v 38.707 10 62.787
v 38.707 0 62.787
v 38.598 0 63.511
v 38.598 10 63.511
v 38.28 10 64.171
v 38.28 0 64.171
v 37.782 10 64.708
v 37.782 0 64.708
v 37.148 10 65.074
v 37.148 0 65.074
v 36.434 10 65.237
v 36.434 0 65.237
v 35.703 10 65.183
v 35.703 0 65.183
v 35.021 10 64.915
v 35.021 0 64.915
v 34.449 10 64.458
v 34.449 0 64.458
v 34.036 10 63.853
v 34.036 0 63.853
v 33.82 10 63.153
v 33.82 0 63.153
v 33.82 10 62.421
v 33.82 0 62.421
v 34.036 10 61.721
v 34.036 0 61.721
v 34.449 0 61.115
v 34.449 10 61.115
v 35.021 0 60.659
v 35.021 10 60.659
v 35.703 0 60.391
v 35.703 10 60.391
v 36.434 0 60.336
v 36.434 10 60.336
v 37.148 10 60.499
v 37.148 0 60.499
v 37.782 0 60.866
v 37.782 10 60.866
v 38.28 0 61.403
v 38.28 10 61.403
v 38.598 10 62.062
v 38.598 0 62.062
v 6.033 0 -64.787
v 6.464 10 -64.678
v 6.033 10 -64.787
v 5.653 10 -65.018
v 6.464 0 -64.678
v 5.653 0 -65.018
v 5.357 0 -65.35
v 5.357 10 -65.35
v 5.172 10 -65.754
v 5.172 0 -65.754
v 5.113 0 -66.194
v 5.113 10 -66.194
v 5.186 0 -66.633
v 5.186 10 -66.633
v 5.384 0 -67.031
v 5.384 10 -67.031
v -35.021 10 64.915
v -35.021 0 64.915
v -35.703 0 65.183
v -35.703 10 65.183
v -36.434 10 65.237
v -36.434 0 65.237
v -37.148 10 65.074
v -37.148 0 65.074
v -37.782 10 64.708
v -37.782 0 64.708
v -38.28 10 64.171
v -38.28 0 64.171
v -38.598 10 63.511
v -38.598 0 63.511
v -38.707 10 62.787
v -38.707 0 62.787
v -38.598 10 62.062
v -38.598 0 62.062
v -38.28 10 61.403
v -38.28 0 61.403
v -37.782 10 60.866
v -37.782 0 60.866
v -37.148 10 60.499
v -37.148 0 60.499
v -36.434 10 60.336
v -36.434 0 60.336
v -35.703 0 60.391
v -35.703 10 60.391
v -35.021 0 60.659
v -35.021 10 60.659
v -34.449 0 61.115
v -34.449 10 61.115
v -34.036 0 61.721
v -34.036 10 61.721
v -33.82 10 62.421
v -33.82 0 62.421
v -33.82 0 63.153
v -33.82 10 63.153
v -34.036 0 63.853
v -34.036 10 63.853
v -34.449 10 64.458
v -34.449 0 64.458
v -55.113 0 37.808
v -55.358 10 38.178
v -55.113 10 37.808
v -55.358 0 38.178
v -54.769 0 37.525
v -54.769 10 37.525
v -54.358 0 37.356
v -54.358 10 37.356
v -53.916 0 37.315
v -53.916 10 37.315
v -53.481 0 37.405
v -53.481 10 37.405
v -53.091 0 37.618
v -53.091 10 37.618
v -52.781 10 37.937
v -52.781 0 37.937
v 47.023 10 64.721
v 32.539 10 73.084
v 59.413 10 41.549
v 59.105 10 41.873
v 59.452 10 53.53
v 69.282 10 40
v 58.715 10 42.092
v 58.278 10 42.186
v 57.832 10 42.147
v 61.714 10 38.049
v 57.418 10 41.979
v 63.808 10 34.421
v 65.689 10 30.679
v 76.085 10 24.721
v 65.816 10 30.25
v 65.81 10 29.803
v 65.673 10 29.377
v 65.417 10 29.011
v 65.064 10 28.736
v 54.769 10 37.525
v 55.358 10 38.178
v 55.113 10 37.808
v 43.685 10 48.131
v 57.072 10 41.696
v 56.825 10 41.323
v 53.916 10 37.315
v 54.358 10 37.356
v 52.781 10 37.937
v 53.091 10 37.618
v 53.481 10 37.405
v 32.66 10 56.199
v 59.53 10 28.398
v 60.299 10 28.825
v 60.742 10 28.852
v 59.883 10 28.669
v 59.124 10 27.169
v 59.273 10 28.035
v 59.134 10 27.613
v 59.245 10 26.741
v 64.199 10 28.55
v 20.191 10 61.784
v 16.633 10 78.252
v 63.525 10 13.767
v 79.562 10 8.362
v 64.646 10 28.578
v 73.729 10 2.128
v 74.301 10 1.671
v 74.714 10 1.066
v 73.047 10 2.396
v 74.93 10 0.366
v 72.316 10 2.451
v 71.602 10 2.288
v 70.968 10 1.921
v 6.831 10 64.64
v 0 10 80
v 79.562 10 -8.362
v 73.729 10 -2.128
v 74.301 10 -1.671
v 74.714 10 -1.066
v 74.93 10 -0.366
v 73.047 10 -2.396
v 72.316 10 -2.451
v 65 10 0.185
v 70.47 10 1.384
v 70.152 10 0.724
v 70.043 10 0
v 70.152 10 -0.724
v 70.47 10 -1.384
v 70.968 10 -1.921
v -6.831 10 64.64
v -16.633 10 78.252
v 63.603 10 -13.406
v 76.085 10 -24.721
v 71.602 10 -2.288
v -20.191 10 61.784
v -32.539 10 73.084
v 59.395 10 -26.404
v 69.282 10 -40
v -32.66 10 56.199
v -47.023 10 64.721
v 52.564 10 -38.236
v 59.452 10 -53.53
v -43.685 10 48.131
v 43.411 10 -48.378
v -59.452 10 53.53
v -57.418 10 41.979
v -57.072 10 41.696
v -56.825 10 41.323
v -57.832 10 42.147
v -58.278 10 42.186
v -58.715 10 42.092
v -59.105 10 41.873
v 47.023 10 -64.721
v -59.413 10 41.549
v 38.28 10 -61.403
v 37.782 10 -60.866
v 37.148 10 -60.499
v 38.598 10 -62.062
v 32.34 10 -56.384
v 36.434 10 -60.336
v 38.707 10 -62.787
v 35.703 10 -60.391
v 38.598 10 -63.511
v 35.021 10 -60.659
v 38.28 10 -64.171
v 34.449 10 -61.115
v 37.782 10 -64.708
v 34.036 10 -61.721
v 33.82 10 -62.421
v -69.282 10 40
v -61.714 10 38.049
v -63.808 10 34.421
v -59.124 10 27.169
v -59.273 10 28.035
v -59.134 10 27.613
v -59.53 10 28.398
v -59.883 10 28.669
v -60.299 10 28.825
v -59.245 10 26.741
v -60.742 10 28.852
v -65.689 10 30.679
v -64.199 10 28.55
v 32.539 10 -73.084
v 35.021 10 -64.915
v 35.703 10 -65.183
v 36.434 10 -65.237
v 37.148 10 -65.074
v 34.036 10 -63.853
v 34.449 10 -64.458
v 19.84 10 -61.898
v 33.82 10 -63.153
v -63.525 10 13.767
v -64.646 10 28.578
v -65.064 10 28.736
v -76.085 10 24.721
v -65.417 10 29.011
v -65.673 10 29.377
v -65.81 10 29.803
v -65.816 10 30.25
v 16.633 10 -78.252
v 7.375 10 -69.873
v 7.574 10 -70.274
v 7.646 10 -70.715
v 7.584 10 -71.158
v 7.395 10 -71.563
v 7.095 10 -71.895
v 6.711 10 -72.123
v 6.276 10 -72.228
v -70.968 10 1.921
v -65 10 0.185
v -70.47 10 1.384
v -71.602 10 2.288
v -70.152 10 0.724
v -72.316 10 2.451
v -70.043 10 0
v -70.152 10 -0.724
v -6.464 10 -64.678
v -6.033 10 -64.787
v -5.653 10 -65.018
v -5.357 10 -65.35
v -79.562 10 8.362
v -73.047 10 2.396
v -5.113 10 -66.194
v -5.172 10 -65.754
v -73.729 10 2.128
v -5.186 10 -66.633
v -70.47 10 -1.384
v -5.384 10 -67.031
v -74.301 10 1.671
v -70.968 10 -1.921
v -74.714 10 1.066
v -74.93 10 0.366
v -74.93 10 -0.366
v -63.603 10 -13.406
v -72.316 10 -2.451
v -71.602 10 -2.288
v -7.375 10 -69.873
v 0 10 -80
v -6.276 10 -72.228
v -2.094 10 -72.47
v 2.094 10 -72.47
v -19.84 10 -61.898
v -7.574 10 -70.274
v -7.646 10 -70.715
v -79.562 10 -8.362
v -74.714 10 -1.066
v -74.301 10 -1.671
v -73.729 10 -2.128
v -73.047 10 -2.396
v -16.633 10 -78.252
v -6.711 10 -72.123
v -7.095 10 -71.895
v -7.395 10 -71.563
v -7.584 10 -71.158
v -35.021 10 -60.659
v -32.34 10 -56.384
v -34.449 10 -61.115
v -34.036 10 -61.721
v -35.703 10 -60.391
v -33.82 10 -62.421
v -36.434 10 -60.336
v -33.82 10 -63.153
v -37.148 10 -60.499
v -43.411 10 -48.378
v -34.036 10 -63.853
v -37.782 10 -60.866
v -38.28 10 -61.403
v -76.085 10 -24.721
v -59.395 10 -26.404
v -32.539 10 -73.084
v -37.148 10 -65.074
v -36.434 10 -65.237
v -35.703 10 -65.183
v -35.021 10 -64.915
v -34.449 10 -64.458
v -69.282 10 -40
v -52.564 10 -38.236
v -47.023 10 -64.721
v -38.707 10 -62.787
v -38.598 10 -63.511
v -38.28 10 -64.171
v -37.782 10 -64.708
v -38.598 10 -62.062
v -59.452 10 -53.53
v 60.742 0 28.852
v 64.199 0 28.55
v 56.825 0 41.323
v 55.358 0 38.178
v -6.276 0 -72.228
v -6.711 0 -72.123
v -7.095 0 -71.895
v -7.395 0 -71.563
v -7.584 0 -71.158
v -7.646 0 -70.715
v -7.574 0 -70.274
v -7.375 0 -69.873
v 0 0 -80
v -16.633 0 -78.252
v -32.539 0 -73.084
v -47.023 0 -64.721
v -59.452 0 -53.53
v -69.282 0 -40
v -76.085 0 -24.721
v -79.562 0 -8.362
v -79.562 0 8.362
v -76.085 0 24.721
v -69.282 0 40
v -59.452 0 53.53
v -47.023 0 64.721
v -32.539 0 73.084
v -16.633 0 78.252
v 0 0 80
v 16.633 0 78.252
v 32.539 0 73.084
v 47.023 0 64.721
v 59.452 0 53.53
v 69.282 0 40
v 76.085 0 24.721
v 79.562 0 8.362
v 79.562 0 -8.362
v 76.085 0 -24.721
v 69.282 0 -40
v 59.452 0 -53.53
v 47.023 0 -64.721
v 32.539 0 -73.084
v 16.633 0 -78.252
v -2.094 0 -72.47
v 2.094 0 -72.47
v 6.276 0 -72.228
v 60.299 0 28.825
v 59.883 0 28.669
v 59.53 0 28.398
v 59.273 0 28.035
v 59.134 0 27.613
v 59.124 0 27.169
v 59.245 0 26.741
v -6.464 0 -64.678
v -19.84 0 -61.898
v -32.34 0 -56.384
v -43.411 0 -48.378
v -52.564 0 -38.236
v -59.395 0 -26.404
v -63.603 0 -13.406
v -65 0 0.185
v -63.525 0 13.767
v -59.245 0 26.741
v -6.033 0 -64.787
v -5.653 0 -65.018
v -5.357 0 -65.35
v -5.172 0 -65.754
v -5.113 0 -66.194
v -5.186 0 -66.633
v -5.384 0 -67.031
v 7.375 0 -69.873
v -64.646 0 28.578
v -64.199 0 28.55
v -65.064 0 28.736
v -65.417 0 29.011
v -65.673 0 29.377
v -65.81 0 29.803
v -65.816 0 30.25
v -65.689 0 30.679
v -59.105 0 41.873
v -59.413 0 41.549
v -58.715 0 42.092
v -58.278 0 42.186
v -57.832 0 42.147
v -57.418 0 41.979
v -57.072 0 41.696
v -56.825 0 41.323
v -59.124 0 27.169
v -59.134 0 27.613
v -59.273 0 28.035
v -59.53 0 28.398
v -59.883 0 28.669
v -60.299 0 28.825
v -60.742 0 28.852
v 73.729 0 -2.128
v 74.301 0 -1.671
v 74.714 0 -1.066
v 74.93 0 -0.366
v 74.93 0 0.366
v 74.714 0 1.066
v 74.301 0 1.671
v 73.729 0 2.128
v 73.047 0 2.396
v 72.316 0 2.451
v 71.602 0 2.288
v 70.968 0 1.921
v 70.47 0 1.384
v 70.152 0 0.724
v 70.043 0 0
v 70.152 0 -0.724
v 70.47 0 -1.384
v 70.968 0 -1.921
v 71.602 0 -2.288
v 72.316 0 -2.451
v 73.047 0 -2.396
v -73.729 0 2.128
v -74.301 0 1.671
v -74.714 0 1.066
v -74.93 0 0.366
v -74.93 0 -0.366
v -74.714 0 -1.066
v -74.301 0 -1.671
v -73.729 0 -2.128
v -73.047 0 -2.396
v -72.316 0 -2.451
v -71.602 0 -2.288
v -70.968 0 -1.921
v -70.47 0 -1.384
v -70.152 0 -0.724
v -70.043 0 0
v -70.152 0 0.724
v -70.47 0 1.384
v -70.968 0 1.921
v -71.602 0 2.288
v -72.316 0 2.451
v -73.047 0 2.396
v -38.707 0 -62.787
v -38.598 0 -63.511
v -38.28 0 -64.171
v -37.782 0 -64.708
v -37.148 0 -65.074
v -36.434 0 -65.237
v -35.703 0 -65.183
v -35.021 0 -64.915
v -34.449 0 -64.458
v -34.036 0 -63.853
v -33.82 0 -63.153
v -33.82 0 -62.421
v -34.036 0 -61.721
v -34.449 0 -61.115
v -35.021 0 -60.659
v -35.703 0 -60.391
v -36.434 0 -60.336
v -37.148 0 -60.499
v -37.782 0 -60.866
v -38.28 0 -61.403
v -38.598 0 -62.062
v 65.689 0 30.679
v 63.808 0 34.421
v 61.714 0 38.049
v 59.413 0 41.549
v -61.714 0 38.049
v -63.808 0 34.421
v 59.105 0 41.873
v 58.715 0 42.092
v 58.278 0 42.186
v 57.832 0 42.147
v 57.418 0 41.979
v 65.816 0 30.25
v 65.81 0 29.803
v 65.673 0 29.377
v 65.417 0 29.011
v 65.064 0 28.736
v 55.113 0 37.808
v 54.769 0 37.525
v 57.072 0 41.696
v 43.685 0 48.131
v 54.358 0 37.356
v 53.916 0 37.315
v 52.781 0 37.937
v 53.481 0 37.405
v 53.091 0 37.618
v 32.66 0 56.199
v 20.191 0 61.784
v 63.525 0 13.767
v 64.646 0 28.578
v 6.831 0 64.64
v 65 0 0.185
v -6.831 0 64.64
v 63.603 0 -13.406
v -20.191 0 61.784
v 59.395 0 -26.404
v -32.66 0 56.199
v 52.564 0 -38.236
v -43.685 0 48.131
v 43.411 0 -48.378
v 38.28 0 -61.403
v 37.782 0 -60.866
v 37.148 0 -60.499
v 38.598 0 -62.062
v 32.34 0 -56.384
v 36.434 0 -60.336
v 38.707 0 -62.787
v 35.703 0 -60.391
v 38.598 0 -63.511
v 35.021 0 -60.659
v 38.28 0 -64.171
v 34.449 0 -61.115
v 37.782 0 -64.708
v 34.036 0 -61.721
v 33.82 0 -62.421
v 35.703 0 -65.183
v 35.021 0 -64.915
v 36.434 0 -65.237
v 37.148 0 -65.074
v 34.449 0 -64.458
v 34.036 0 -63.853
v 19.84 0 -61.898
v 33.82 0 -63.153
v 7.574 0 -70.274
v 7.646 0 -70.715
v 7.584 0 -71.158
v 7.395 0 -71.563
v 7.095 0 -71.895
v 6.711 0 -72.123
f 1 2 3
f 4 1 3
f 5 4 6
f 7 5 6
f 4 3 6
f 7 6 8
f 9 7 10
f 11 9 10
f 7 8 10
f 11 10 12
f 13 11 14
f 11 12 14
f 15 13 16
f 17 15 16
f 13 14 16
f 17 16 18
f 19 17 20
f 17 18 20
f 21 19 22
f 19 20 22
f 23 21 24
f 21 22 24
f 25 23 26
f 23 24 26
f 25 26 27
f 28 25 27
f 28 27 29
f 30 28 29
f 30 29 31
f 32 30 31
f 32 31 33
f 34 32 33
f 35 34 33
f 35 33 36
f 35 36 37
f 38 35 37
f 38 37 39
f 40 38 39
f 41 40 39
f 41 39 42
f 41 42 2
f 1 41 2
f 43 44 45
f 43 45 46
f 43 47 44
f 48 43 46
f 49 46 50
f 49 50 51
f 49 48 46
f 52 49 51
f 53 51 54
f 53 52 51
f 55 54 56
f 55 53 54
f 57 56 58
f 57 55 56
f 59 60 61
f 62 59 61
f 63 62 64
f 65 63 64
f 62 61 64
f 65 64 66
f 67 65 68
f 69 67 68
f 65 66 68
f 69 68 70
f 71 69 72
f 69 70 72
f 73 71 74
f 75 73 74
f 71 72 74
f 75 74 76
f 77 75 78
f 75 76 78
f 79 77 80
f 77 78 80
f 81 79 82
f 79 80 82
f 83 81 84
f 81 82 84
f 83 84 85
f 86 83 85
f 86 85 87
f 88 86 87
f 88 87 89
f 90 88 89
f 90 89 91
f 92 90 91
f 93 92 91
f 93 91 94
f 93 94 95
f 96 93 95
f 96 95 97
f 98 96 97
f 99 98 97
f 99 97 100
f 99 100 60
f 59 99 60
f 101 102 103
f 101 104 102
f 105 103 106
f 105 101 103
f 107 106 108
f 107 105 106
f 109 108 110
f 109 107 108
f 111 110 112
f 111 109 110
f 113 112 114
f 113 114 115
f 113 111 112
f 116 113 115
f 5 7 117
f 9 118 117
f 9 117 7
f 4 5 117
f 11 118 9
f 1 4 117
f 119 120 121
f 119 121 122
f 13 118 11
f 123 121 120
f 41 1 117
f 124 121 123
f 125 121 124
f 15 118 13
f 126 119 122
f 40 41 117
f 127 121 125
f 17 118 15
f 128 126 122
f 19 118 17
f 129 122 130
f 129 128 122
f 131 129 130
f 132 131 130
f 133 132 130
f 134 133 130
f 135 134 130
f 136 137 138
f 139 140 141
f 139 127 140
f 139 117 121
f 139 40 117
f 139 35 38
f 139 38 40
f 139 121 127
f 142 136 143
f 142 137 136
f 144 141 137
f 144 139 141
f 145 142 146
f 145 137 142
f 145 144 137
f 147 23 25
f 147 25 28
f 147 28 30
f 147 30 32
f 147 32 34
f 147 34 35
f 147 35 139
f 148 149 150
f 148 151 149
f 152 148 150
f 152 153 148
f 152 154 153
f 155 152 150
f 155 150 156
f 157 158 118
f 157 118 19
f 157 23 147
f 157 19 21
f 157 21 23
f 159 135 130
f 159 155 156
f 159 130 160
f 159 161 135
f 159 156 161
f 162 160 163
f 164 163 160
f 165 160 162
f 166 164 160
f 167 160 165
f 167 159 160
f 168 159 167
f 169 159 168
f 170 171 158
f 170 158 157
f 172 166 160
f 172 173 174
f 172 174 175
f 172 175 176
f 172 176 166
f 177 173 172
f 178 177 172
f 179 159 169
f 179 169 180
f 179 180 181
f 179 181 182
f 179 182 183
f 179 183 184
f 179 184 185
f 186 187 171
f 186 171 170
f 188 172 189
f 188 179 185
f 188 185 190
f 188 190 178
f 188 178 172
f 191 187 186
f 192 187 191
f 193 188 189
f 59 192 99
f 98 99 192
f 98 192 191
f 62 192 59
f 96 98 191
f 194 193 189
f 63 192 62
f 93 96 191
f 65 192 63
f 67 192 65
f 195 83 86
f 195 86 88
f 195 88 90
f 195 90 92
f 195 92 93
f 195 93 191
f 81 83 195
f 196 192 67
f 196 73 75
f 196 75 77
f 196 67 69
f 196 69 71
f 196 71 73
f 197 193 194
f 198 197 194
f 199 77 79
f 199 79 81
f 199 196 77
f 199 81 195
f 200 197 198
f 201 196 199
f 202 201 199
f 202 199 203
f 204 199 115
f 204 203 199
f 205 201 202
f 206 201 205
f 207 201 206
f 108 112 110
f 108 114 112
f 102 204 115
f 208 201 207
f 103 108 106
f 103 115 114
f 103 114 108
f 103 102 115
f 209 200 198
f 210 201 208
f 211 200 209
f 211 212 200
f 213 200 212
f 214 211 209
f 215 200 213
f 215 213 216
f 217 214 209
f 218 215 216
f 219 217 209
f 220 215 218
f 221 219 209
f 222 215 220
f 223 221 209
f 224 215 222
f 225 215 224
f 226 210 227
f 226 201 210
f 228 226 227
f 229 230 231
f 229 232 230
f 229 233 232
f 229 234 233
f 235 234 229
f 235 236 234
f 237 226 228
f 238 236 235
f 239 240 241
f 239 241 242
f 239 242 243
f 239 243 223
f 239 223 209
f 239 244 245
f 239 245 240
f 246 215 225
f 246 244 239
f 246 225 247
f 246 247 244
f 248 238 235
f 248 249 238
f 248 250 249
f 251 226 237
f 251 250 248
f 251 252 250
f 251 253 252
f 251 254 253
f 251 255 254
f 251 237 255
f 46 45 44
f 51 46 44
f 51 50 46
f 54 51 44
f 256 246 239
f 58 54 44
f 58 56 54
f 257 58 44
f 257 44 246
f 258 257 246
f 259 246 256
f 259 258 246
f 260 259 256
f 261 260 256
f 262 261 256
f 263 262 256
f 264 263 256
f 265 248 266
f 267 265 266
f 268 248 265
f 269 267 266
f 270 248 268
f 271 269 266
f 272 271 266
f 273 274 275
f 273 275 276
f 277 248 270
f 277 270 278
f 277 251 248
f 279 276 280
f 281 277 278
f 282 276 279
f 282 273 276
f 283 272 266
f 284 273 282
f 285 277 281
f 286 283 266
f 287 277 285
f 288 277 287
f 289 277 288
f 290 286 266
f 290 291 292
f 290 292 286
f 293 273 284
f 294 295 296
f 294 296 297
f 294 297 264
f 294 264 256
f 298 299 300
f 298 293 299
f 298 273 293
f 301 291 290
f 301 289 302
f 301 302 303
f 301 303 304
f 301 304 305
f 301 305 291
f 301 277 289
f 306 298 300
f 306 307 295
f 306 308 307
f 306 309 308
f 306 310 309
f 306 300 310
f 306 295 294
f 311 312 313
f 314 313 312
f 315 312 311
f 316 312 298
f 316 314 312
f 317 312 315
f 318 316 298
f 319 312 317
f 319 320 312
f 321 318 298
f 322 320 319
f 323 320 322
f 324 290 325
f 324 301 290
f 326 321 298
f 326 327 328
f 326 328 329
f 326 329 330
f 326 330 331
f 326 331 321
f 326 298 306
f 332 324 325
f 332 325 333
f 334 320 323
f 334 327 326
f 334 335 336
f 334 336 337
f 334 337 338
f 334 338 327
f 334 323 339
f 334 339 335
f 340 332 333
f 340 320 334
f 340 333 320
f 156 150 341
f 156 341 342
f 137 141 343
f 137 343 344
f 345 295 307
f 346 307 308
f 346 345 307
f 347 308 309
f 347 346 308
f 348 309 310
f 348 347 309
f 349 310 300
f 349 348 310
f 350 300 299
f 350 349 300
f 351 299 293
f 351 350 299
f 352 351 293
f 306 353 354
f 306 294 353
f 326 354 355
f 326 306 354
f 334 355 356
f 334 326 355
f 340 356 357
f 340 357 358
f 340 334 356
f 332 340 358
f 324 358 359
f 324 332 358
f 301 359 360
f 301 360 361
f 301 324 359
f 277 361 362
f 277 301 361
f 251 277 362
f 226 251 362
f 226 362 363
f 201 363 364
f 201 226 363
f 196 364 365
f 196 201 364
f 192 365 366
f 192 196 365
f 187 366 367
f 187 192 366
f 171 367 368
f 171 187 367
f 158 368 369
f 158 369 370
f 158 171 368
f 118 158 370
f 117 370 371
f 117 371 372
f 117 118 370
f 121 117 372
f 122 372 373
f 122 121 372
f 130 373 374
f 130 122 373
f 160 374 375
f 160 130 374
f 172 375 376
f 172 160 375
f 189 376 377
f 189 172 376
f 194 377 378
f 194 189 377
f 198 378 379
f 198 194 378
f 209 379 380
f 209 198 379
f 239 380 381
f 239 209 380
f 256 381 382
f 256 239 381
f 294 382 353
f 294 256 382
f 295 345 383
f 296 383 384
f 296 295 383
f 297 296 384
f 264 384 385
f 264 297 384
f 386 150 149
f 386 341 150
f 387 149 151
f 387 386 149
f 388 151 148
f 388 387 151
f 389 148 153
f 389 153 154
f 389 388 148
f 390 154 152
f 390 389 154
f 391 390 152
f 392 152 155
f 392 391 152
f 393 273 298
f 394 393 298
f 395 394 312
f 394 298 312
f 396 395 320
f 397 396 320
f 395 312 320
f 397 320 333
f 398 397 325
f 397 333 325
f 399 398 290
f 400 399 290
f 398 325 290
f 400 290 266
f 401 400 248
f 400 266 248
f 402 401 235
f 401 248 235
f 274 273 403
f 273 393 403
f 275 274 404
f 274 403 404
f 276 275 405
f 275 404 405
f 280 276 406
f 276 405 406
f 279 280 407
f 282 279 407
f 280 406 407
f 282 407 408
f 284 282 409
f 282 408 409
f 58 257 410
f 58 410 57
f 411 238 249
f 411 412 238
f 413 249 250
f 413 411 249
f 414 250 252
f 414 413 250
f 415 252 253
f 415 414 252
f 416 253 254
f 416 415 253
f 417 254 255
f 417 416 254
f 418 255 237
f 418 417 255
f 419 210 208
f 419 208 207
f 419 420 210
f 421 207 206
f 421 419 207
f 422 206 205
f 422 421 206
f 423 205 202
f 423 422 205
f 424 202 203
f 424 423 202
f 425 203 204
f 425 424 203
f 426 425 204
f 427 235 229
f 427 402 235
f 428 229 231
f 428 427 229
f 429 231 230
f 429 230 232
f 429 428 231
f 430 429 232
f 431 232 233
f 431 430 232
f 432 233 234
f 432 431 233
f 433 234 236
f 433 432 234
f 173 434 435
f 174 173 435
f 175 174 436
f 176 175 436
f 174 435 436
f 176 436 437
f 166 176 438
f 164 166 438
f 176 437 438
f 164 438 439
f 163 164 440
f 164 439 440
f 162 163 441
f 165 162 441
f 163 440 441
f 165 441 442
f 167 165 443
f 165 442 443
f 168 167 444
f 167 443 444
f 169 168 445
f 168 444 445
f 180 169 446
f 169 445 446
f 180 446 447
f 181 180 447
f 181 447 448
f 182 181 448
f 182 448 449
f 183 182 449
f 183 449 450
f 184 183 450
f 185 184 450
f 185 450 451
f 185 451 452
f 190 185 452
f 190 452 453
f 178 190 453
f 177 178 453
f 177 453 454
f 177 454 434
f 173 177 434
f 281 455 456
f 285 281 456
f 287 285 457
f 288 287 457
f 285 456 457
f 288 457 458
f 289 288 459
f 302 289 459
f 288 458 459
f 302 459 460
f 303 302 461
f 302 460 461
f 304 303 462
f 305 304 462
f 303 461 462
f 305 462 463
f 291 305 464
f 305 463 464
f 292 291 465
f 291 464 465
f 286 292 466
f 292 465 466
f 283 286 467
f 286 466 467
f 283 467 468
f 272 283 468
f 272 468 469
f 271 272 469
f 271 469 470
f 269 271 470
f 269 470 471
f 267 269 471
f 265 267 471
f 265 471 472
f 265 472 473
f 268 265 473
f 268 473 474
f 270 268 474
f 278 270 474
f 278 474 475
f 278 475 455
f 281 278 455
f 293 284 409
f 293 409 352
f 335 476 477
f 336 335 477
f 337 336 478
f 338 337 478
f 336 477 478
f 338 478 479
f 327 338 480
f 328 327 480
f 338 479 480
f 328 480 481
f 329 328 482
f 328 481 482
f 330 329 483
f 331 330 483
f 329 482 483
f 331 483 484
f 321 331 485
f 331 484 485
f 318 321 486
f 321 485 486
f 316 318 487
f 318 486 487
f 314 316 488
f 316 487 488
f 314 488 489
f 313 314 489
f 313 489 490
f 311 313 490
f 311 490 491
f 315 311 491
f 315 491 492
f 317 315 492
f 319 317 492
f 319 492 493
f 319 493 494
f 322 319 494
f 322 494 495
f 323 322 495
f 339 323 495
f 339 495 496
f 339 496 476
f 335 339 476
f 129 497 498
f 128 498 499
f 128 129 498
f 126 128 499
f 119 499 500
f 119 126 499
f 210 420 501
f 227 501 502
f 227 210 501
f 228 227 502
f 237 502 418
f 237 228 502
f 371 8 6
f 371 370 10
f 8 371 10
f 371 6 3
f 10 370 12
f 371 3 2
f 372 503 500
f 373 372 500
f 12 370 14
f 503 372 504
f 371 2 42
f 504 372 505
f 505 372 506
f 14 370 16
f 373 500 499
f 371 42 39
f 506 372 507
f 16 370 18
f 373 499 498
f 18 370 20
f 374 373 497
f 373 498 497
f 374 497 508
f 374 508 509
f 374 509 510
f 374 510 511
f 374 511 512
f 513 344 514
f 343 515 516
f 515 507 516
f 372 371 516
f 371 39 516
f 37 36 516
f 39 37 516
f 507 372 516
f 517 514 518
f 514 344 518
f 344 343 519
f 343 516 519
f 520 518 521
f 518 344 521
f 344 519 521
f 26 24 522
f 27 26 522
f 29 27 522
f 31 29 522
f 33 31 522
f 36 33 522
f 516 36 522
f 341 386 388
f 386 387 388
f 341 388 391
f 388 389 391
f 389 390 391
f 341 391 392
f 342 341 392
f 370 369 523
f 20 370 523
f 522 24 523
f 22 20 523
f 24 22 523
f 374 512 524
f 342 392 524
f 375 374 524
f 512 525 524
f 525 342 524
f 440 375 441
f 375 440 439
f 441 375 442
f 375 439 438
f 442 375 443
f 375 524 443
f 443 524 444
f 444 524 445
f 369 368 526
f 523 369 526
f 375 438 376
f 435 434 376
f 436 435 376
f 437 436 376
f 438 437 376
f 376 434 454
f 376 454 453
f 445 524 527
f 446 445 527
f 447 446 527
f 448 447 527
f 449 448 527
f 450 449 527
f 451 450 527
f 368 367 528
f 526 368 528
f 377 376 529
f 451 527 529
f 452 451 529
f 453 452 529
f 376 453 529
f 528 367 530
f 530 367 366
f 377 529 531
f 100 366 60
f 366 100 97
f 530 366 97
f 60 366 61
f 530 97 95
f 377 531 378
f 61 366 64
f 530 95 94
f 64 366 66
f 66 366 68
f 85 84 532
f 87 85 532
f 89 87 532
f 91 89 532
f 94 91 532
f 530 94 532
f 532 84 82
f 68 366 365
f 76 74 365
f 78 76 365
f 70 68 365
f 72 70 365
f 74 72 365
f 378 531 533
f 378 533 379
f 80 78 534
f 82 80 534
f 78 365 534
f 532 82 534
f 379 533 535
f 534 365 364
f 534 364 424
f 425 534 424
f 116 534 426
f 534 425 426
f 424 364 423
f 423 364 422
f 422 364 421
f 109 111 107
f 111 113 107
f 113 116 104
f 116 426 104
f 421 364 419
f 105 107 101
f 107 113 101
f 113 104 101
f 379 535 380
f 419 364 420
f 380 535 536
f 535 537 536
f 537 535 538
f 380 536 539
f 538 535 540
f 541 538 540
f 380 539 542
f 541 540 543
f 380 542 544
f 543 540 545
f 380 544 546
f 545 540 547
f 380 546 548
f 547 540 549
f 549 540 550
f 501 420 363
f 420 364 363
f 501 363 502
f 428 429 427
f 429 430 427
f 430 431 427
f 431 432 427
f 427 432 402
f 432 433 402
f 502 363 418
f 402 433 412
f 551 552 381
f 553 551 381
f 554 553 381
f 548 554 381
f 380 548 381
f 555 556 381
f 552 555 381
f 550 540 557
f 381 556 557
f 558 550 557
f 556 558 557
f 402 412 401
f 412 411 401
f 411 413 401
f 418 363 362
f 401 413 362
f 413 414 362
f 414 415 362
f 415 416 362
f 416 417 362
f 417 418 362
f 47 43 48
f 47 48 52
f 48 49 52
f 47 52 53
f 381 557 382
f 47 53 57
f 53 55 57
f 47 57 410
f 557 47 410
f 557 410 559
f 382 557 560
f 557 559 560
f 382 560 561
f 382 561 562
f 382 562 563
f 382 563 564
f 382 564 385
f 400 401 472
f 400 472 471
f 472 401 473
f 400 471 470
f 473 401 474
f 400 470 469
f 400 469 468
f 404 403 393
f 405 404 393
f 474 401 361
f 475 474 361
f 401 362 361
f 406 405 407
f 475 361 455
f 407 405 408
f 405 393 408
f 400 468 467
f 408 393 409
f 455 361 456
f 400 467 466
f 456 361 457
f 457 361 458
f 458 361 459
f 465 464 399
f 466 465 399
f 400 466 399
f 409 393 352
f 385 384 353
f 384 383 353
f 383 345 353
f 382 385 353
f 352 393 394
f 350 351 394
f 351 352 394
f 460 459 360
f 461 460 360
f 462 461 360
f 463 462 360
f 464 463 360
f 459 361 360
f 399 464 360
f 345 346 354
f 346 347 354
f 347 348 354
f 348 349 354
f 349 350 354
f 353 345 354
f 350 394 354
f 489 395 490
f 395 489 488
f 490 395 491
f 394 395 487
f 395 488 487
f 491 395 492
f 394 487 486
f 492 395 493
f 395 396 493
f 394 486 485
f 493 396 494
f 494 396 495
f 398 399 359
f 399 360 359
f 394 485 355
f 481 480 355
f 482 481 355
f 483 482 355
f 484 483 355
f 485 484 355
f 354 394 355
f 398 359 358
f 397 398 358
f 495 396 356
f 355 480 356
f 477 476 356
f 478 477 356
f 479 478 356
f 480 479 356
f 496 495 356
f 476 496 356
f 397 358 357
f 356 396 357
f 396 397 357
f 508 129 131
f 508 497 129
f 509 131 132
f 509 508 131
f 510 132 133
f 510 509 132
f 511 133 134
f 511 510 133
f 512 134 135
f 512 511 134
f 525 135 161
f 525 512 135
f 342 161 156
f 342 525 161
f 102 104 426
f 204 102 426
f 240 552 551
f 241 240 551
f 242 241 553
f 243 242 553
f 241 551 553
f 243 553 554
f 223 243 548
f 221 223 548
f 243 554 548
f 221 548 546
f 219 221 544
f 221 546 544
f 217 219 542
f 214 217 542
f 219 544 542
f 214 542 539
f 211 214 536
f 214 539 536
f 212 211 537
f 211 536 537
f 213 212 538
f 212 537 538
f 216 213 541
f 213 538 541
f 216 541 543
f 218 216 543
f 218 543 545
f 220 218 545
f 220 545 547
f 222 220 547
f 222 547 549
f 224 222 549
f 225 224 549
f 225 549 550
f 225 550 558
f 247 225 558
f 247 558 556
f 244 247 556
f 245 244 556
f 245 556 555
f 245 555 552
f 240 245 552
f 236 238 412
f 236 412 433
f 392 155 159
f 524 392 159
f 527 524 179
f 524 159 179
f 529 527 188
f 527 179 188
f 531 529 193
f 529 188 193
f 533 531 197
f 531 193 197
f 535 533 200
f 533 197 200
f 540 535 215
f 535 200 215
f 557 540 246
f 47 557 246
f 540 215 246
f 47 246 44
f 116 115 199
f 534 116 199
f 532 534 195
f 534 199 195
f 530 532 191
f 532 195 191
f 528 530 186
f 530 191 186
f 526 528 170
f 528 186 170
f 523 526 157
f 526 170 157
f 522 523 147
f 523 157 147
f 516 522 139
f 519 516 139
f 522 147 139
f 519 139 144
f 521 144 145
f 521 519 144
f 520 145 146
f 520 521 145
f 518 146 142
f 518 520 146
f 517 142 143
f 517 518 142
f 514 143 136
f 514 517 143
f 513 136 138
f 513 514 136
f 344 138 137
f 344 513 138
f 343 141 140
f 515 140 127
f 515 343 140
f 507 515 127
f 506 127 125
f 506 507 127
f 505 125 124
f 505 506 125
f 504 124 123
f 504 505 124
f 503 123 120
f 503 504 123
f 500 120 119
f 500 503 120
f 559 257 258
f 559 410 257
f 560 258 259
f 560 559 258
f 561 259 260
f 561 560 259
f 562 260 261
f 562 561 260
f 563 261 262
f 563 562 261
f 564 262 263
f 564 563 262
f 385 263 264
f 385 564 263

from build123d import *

# Parameters (mm, degrees)
SKETCH2_W                    = 15
SKETCH2_H                    = 10
CUT_EXTRUDE1_DEPTH           = 114.578166916
FILLET1_R                    = 1.5
CIRPATTERN2_COUNT            = 3
FILLET1_OF_CIRPATTERN2_R     = 1.5
F_10_0_1935_DIAMETER_HOLE1_D = 4.9149
CIRPATTERN3_COUNT            = 6


with BuildPart() as part:
    # Sketch2 → Revolve1 (revolve)
    with BuildSketch(Plane(origin=(0, 0, 0), x_dir=(0, 0, -1), z_dir=(1, 0, 0)), mode=Mode.PRIVATE) as revolve1_sk:
        with Locations((-72.5, 5)):
            Rectangle(SKETCH2_W, SKETCH2_H)
    revolve(revolve1_sk.sketch.rotate(Axis((0, -0.75, 0), (0, 1, 0)), 180), axis=Axis((0, -0.75, 0), (0, 1, 0)))

    # Sketch4 → Cut-Extrude1 (cut, through all)
    with BuildSketch(Plane(origin=(0, 10, 0), x_dir=(1, 0, 0), z_dir=(0, 1, 0))):
        with BuildLine():
            Line((-3.881158746, 64.88402428), (-8.835527397, 71.959595994))
            ThreePointArc((-8.835527397, 71.959595994), (0, 72.5), (8.835527397, 71.959595994))
            Line((8.835527397, 71.959595994), (3.881158746, 64.88402428))
            ThreePointArc((3.881158746, 64.88402428), (0, 65), (-3.881158746, 64.88402428))
        make_face()
    cut_extrude1 = extrude(amount=-CUT_EXTRUDE1_DEPTH, mode=Mode.SUBTRACT)

    # Fillet1
    fillet1_edges = [part.edges().sort_by_distance(p)[0] for p in [
        (3.881158746, 5, -64.88402428),
        (-3.881158746, 5, -64.88402428),
        (-8.835527397, 5, -71.959595994),
        (8.835527397, 5, -71.959595994),
    ]]
    fillet(fillet1_edges, radius=FILLET1_R)

    # CirPattern2: Cut-Extrude1 ×3 about axis
    cirpattern2_axis = Axis((0, 0, 0), (0, 1, 0))
    for i in range(1, CIRPATTERN2_COUNT):
        add(cut_extrude1.rotate(cirpattern2_axis, i * 360 / CIRPATTERN2_COUNT), mode=Mode.SUBTRACT)

    # Fillet1 of CirPattern2
    fillet1_of_cirpattern2_edges = [part.edges().sort_by_distance(p)[0] for p in [
        (-58.131792699, 5, 29.08083007),
        (-54.250633954, 5, 35.80319421),
        (-57.901074478, 5, 43.631589179),
        (-66.736601875, 5, 28.328006815),
        (54.250633954, 5, 35.80319421),
        (58.131792699, 5, 29.08083007),
        (66.736601875, 5, 28.328006815),
        (57.901074478, 5, 43.631589179),
    ]]
    fillet(fillet1_of_cirpattern2_edges, radius=FILLET1_OF_CIRPATTERN2_R)

    # #10 (0.1935) Diameter Hole1 (through all)
    with Locations(Plane(origin=(0, 10, 0), x_dir=(1, 0, 0), z_dir=(0, 1, 0))):
        with Locations((-36.25, 62.786841774)):
            f_10_0_1935_diameter_hole1 = Hole(F_10_0_1935_DIAMETER_HOLE1_D / 2)

    # CirPattern3: #10 (0.1935) Diameter Hole1 ×6 about axis
    cirpattern3_axis = Axis((0, 0, 0), (0, 1, 0))
    for i in range(1, CIRPATTERN3_COUNT):
        add(f_10_0_1935_diameter_hole1.rotate(cirpattern3_axis, i * 360 / CIRPATTERN3_COUNT), mode=Mode.SUBTRACT)


solid = part.part
